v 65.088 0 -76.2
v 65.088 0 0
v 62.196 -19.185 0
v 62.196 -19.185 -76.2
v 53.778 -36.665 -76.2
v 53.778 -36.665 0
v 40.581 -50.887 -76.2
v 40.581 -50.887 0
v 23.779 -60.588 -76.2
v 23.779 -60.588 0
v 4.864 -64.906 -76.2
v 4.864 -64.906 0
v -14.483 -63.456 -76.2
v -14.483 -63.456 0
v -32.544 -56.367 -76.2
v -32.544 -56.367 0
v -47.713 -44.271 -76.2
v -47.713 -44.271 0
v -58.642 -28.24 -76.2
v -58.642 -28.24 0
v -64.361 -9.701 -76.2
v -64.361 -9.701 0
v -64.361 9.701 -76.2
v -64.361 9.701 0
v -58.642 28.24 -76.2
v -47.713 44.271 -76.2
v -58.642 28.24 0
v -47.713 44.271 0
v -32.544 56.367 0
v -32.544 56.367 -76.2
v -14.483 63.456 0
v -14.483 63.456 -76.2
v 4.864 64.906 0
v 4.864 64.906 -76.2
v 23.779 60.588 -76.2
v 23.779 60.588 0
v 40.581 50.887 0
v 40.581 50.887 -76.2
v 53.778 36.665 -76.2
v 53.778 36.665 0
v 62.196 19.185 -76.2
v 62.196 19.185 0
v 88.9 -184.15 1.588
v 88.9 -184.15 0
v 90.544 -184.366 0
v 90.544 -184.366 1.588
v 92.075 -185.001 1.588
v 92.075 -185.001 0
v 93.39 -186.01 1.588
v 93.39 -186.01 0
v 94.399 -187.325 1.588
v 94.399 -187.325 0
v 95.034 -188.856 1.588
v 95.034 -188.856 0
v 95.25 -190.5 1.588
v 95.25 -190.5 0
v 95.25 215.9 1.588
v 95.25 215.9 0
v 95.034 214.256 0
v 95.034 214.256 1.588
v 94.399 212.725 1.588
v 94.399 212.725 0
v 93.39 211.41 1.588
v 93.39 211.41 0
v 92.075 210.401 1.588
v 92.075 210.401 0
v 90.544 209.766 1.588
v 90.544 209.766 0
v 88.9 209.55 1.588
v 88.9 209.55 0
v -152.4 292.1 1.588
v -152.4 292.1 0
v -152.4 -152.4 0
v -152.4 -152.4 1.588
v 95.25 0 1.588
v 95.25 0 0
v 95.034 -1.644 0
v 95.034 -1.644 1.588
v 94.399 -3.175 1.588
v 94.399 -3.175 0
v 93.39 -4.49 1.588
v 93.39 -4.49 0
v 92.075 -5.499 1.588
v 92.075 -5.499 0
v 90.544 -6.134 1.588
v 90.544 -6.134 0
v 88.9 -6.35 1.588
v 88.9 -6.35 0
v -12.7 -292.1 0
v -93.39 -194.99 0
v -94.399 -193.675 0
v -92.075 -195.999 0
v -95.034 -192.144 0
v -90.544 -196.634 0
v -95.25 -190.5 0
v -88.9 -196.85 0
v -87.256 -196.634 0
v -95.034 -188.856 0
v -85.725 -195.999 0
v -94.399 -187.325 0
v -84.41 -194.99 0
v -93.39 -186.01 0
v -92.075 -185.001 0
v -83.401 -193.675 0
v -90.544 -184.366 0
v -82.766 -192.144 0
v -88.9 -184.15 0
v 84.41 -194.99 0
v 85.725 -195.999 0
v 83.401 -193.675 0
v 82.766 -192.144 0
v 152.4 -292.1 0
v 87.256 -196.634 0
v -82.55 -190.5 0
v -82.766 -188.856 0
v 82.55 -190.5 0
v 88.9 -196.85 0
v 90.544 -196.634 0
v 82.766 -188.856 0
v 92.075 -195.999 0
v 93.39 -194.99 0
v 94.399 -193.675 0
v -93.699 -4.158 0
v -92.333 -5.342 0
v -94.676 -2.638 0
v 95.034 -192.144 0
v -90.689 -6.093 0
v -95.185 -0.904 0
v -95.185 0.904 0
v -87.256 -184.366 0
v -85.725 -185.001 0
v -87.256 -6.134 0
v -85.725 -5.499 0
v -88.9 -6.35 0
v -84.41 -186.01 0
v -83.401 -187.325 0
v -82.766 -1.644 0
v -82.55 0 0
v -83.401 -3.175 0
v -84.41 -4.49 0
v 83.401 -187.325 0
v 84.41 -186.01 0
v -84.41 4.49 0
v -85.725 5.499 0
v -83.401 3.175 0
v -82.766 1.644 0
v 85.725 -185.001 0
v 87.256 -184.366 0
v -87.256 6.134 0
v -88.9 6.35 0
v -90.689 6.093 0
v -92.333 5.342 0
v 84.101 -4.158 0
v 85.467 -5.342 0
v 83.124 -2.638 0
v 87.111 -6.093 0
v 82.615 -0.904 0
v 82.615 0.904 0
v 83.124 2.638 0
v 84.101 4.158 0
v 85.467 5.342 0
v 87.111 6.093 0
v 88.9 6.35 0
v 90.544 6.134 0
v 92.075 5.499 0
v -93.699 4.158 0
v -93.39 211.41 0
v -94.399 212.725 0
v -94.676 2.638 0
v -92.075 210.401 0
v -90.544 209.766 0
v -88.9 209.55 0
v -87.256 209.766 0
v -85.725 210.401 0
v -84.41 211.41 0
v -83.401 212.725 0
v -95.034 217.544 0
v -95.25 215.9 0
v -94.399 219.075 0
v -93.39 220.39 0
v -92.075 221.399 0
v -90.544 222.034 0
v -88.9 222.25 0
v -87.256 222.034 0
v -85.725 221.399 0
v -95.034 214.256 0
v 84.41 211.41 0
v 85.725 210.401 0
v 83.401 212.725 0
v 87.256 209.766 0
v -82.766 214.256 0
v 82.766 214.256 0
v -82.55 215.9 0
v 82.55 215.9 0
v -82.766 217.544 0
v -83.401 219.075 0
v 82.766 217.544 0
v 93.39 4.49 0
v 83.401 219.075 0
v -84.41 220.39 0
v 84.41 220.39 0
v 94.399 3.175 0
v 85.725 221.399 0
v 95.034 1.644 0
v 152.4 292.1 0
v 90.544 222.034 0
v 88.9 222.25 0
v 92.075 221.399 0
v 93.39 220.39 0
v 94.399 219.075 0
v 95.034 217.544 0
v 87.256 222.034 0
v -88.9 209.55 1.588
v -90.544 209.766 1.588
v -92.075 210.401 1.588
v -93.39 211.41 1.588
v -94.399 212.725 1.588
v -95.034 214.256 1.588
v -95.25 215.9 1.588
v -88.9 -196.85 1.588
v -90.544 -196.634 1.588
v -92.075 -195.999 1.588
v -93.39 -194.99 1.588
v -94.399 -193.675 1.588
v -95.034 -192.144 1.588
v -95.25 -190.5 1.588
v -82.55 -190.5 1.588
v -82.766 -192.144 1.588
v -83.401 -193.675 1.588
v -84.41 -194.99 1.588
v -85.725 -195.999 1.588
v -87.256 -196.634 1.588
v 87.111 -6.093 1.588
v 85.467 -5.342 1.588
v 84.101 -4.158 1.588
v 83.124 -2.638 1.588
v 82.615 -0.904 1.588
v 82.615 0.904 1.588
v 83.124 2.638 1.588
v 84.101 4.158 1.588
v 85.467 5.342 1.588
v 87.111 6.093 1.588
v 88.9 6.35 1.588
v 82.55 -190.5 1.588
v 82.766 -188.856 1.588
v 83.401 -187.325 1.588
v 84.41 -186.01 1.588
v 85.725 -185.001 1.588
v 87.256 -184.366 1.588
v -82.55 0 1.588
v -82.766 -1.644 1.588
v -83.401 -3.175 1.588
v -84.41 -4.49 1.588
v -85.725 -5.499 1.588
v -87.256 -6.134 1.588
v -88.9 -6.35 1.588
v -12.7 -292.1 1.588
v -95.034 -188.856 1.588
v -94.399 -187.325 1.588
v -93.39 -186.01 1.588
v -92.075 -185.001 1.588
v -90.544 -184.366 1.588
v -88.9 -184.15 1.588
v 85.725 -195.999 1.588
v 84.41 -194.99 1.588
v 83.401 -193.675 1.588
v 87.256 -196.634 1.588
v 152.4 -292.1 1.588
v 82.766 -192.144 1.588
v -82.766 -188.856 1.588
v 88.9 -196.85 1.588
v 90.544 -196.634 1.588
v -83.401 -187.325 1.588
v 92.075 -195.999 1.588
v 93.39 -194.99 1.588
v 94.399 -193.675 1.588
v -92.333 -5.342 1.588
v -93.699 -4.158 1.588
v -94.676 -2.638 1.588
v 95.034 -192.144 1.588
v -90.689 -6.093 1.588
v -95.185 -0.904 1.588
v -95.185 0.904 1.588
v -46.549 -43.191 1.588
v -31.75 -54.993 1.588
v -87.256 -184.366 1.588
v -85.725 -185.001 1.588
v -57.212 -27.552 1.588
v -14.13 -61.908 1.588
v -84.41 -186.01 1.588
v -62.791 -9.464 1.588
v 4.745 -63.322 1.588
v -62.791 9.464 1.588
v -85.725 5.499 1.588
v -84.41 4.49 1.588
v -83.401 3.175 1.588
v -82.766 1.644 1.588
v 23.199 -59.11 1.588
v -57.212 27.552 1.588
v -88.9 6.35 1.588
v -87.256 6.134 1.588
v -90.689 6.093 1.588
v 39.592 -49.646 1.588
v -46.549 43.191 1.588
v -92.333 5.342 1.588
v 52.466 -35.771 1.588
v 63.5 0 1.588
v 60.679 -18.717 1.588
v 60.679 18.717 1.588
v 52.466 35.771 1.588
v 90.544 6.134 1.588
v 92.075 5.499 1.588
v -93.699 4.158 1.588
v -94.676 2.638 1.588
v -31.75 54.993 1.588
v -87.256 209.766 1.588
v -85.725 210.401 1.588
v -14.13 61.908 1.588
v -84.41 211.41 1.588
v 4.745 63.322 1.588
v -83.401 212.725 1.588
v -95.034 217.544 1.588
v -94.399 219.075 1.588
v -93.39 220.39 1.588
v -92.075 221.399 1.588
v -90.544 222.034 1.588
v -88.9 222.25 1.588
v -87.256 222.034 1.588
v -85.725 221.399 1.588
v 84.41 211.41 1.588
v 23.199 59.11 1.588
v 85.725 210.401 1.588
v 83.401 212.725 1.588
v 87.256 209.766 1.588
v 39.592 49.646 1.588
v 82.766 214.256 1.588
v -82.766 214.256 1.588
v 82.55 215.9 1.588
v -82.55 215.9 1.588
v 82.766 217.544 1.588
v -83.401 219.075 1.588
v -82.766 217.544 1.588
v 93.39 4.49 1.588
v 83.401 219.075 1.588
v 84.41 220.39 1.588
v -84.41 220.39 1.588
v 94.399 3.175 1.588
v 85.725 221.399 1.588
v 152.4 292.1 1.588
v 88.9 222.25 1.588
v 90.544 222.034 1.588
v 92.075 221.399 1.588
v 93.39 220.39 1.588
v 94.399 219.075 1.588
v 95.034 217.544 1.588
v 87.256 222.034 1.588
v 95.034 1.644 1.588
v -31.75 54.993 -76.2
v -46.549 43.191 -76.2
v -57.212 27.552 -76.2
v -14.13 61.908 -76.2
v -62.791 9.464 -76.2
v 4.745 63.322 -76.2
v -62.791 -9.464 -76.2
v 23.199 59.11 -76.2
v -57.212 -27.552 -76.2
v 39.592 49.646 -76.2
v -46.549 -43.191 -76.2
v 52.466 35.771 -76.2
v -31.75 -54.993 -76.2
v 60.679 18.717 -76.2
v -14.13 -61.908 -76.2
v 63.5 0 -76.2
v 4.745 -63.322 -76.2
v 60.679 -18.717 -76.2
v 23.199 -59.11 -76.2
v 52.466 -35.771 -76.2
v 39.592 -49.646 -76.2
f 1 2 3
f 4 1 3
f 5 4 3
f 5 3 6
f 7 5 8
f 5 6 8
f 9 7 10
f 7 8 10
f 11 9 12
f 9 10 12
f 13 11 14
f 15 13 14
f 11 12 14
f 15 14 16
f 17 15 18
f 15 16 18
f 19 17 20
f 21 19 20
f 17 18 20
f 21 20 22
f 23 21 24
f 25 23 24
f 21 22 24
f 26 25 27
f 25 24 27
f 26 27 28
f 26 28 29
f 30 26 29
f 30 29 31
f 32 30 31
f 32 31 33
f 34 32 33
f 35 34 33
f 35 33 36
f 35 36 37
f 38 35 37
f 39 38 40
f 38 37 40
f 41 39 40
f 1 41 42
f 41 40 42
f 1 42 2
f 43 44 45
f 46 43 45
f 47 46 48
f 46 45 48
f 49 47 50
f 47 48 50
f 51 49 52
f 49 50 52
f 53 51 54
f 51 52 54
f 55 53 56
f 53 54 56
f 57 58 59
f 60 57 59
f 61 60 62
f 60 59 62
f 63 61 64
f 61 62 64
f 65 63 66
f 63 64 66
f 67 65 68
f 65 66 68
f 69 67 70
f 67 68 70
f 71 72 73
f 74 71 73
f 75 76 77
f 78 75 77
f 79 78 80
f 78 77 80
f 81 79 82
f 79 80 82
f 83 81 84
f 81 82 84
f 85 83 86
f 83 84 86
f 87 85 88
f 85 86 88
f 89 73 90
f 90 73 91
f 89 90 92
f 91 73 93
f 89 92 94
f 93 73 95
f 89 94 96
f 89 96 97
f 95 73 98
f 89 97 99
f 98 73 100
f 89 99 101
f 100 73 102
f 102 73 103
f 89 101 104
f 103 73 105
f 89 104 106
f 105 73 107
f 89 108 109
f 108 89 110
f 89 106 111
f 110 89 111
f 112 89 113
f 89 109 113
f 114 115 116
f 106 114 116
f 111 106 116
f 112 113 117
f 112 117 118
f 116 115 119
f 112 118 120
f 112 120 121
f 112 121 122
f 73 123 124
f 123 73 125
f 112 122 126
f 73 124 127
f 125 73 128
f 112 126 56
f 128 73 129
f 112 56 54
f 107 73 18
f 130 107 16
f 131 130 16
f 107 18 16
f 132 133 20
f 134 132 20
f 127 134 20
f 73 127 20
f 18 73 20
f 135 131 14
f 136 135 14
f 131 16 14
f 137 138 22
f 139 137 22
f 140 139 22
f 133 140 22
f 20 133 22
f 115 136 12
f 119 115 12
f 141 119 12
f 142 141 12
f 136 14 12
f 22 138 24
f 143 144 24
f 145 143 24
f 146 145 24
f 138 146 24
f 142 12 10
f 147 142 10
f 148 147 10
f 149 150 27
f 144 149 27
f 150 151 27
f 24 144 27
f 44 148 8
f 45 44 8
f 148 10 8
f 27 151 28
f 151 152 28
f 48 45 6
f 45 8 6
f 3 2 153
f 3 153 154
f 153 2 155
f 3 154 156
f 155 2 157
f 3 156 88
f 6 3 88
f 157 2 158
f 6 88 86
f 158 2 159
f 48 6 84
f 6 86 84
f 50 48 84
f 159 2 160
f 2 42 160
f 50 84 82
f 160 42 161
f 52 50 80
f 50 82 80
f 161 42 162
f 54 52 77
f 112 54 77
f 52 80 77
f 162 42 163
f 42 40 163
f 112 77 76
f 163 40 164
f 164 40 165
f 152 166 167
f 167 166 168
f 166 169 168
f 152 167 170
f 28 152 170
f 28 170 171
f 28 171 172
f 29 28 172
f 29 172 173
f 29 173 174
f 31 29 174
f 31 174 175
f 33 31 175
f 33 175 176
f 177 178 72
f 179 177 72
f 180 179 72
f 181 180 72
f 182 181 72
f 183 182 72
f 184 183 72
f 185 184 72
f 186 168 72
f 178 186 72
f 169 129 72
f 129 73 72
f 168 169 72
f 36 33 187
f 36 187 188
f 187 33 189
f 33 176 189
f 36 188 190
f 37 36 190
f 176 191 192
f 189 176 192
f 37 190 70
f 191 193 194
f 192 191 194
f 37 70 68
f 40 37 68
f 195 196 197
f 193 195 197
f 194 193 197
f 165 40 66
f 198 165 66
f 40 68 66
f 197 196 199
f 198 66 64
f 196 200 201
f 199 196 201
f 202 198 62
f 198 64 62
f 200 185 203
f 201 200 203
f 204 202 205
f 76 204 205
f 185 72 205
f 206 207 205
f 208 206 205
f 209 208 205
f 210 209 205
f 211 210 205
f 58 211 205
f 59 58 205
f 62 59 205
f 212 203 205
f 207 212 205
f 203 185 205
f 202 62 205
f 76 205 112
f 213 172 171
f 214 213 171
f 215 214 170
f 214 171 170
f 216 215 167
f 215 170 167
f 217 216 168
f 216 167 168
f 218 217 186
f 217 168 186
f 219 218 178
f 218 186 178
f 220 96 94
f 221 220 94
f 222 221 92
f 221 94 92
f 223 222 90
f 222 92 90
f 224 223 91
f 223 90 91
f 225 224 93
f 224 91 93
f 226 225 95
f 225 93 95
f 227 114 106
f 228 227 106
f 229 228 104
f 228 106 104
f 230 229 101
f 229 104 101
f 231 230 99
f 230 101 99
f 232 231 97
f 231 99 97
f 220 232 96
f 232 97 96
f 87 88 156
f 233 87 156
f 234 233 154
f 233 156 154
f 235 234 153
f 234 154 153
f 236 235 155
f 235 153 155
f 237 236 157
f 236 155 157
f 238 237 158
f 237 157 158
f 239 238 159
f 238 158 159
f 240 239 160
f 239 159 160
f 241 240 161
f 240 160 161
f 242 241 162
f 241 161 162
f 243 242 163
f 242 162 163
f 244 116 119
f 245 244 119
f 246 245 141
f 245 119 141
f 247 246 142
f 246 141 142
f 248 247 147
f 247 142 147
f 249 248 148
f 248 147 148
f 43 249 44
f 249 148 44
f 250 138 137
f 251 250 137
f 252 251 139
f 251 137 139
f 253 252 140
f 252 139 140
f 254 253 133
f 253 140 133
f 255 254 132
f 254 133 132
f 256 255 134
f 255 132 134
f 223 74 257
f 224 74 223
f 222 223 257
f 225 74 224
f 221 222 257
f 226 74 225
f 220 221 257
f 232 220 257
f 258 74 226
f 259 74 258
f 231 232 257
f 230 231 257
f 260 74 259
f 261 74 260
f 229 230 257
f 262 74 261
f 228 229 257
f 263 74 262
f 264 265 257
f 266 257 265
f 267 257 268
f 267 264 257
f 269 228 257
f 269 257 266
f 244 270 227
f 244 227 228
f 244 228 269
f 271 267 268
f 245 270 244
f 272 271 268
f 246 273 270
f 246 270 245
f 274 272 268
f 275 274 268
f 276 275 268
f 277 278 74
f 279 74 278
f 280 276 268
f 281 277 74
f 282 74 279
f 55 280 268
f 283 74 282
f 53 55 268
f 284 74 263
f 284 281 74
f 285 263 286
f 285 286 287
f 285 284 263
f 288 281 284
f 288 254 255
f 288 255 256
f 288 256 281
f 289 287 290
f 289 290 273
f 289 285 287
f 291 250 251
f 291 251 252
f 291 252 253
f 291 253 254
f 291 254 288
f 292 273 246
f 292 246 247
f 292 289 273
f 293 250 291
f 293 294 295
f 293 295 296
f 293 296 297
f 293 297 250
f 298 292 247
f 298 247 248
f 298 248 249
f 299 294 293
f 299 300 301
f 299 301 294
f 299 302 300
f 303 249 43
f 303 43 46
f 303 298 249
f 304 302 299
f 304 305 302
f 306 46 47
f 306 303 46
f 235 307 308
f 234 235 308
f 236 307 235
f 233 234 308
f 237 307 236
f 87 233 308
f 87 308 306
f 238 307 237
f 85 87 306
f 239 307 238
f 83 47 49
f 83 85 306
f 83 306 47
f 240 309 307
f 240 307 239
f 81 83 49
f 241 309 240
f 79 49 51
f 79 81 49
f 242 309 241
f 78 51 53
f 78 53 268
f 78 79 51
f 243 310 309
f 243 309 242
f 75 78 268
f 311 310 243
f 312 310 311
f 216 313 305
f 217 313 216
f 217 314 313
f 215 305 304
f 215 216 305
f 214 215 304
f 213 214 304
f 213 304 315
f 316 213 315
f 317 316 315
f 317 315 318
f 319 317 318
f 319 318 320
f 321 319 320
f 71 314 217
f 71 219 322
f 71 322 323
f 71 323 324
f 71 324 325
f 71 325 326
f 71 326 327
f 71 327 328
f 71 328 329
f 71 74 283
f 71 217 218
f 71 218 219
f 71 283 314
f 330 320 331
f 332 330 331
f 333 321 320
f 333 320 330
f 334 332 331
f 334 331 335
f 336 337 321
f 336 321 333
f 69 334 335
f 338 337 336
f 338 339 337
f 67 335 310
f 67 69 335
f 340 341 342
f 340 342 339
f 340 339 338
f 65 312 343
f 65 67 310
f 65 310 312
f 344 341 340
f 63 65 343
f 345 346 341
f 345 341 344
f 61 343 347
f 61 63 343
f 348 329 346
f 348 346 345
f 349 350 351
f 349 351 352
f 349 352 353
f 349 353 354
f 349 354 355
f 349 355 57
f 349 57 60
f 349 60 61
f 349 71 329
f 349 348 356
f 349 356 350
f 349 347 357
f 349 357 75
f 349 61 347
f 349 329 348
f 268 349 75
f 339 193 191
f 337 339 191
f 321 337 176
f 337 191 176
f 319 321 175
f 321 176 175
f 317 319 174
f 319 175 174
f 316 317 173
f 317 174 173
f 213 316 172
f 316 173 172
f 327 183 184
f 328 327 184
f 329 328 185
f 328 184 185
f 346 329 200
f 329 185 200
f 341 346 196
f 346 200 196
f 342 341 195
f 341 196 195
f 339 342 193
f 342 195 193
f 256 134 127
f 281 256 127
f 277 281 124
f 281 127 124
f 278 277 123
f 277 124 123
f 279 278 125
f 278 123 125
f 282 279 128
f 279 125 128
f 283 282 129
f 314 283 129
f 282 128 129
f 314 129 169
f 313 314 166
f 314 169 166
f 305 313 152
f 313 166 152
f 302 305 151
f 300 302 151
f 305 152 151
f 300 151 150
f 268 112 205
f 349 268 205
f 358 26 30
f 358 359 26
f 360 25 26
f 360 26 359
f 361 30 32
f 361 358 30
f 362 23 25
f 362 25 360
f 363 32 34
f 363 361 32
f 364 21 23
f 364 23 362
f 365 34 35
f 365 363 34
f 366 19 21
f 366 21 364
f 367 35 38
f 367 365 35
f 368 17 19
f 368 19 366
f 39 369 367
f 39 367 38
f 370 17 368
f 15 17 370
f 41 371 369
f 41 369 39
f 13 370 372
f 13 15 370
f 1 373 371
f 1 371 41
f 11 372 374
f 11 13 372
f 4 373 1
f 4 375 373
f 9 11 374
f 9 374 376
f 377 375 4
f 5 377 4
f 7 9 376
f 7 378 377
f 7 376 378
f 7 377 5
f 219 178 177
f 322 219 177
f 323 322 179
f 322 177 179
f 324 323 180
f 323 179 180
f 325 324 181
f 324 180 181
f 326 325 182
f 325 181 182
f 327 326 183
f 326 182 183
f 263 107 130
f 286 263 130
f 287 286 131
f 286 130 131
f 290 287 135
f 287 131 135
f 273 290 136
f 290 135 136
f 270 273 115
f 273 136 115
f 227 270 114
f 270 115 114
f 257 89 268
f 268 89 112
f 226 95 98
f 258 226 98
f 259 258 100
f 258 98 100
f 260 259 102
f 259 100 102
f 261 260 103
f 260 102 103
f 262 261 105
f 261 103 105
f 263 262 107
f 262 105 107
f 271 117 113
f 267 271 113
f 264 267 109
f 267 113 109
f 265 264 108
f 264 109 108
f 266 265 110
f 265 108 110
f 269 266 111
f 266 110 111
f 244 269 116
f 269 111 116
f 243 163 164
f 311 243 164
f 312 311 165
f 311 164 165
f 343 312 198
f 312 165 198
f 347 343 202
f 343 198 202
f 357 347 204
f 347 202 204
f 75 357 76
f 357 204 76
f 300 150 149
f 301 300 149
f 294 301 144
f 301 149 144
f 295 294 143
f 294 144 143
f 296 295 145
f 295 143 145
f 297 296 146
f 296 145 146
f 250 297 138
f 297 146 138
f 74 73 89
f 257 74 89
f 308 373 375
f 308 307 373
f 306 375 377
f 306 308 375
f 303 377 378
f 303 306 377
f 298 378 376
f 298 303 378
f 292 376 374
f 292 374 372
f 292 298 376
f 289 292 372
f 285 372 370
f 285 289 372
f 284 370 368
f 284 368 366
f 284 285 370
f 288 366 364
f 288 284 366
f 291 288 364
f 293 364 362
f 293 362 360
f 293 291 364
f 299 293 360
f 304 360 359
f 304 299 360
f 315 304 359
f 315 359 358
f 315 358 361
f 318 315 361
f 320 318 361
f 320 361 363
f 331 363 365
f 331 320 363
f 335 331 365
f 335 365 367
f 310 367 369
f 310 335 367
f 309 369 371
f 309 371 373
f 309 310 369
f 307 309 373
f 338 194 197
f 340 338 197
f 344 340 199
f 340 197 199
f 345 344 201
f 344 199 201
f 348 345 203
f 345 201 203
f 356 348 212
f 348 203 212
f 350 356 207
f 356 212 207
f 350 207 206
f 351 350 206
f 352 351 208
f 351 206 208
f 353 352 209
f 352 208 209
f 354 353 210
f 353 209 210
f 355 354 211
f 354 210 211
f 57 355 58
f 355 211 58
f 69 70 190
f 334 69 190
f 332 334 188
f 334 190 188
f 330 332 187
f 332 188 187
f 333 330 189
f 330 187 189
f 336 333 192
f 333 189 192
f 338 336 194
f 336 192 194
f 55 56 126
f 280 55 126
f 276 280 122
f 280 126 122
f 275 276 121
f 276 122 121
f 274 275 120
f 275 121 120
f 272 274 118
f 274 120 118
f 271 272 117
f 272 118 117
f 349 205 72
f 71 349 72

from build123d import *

# Parameters (mm, degrees)
F0_R     = 63.5
F1_DEPTH = 1.5875
F2_R     = 65.0875
F2_R_2   = 63.5
F3_DEPTH = 76.2


with BuildPart() as f1:
    # F0 (on Top) → F1 (new body)
    with BuildSketch(Plane.XY):
        with BuildLine():
            Line((152.4, 215.9), (152.4, 292.1))
            Line((152.4, 292.1), (88.9, 292.1))
            Line((88.9, 292.1), (88.9, 222.25))
            ThreePointArc((88.9, 222.25), (93.390128, 220.390128), (95.25, 215.9))
            Line((95.25, 215.9), (152.4, 215.9))
        make_face()
        with BuildLine():
            Line((88.9, 222.25), (88.9, 292.1))
            Line((88.9, 292.1), (-88.9, 292.1))
            Line((-88.9, 292.1), (-88.9, 222.25))
            ThreePointArc((-88.9, 222.25), (-84.409872, 220.390128), (-82.55, 215.9))
            ThreePointArc((-82.55, 215.9), (-84.409872, 211.409872), (-88.9, 209.55))
            Line((-88.9, 209.55), (-88.9, 6.35))
            ThreePointArc((-88.9, 6.35), (-84.409872, 4.490128), (-82.55, 0))
            ThreePointArc((-82.55, 0), (-84.409872, -4.490128), (-88.9, -6.35))
            Line((-88.9, -6.35), (-88.9, -184.15))
            ThreePointArc((-88.9, -184.15), (-84.409872, -186.009872), (-82.55, -190.5))
            Line((-82.55, -190.5), (82.55, -190.5))
            ThreePointArc((82.55, -190.5), (84.409872, -186.009872), (88.9, -184.15))
            Line((88.9, -184.15), (88.9, -6.35))
            ThreePointArc((88.9, -6.35), (82.55, 0), (88.9, 6.35))
            Line((88.9, 6.35), (88.9, 209.55))
            ThreePointArc((88.9, 209.55), (84.409872, 211.409872), (82.55, 215.9))
            ThreePointArc((82.55, 215.9), (84.409872, 220.390128), (88.9, 222.25))
        make_face()
        Circle(F0_R, mode=Mode.SUBTRACT)
        with BuildLine():
            Line((152.4, -152.4), (152.4, 215.9))
            Line((152.4, 215.9), (95.25, 215.9))
            ThreePointArc((95.25, 215.9), (93.390128, 211.409872), (88.9, 209.55))
            Line((88.9, 209.55), (88.9, 6.35))
            ThreePointArc((88.9, 6.35), (93.390128, 4.490128), (95.25, 0))
            ThreePointArc((95.25, 0), (93.390128, -4.490128), (88.9, -6.35))
            Line((88.9, -6.35), (88.9, -184.15))
            ThreePointArc((88.9, -184.15), (93.390128, -186.009872), (95.25, -190.5))
            Line((95.25, -190.5), (152.4, -190.5))
            Line((152.4, -190.5), (152.4, -152.4))
        make_face()
        with BuildLine():
            Line((-88.9, 222.25), (-88.9, 292.1))
            Line((-88.9, 292.1), (-152.4, 292.1))
            Line((-152.4, 292.1), (-152.4, 215.9))
            Line((-152.4, 215.9), (-95.25, 215.9))
            ThreePointArc((-95.25, 215.9), (-93.390128, 220.390128), (-88.9, 222.25))
        make_face()
        with BuildLine():
            Line((152.4, -292.1), (152.4, -190.5))
            Line((152.4, -190.5), (95.25, -190.5))
            ThreePointArc((95.25, -190.5), (93.390128, -194.990128), (88.9, -196.85))
            Line((88.9, -196.85), (88.9, -292.1))
            Line((88.9, -292.1), (152.4, -292.1))
        make_face()
        with BuildLine():
            Line((-95.25, 215.9), (-152.4, 215.9))
            Line((-152.4, 215.9), (-152.4, -152.4))
            Line((-152.4, -152.4), (-114.3, -190.5))
            Line((-114.3, -190.5), (-95.25, -190.5))
            ThreePointArc((-95.25, -190.5), (-93.390128, -186.009872), (-88.9, -184.15))
            Line((-88.9, -184.15), (-88.9, -6.35))
            ThreePointArc((-88.9, -6.35), (-95.25, 0), (-88.9, 6.35))
            Line((-88.9, 6.35), (-88.9, 209.55))
            ThreePointArc((-88.9, 209.55), (-93.390128, 211.409872), (-95.25, 215.9))
        make_face()
        with BuildLine():
            Line((12.7, -292.1), (88.9, -292.1))
            Line((88.9, -292.1), (88.9, -196.85))
            ThreePointArc((88.9, -196.85), (84.409872, -194.990128), (82.55, -190.5))
            Line((82.55, -190.5), (-82.55, -190.5))
            ThreePointArc((-82.55, -190.5), (-84.409872, -194.990128), (-88.9, -196.85))
            Line((-88.9, -196.85), (-88.9, -215.9))
            Line((-88.9, -215.9), (-12.7, -292.1))
            Line((-12.7, -292.1), (12.7, -292.1))
        make_face()
        with BuildLine():
            Line((-95.25, -190.5), (-114.3, -190.5))
            Line((-114.3, -190.5), (-88.9, -215.9))
            Line((-88.9, -215.9), (-88.9, -196.85))
            ThreePointArc((-88.9, -196.85), (-93.390128, -194.990128), (-95.25, -190.5))
        make_face()
    extrude(amount=F1_DEPTH)

    # F2 (on face) → F3 (join)
    with BuildSketch(Plane(origin=(0, 0, 0), x_dir=(1, 0, 0), z_dir=(0, 0, -1))):
        Circle(F2_R)
        Circle(F2_R_2, mode=Mode.SUBTRACT)
    extrude(amount=F3_DEPTH)


solid = f1.part
